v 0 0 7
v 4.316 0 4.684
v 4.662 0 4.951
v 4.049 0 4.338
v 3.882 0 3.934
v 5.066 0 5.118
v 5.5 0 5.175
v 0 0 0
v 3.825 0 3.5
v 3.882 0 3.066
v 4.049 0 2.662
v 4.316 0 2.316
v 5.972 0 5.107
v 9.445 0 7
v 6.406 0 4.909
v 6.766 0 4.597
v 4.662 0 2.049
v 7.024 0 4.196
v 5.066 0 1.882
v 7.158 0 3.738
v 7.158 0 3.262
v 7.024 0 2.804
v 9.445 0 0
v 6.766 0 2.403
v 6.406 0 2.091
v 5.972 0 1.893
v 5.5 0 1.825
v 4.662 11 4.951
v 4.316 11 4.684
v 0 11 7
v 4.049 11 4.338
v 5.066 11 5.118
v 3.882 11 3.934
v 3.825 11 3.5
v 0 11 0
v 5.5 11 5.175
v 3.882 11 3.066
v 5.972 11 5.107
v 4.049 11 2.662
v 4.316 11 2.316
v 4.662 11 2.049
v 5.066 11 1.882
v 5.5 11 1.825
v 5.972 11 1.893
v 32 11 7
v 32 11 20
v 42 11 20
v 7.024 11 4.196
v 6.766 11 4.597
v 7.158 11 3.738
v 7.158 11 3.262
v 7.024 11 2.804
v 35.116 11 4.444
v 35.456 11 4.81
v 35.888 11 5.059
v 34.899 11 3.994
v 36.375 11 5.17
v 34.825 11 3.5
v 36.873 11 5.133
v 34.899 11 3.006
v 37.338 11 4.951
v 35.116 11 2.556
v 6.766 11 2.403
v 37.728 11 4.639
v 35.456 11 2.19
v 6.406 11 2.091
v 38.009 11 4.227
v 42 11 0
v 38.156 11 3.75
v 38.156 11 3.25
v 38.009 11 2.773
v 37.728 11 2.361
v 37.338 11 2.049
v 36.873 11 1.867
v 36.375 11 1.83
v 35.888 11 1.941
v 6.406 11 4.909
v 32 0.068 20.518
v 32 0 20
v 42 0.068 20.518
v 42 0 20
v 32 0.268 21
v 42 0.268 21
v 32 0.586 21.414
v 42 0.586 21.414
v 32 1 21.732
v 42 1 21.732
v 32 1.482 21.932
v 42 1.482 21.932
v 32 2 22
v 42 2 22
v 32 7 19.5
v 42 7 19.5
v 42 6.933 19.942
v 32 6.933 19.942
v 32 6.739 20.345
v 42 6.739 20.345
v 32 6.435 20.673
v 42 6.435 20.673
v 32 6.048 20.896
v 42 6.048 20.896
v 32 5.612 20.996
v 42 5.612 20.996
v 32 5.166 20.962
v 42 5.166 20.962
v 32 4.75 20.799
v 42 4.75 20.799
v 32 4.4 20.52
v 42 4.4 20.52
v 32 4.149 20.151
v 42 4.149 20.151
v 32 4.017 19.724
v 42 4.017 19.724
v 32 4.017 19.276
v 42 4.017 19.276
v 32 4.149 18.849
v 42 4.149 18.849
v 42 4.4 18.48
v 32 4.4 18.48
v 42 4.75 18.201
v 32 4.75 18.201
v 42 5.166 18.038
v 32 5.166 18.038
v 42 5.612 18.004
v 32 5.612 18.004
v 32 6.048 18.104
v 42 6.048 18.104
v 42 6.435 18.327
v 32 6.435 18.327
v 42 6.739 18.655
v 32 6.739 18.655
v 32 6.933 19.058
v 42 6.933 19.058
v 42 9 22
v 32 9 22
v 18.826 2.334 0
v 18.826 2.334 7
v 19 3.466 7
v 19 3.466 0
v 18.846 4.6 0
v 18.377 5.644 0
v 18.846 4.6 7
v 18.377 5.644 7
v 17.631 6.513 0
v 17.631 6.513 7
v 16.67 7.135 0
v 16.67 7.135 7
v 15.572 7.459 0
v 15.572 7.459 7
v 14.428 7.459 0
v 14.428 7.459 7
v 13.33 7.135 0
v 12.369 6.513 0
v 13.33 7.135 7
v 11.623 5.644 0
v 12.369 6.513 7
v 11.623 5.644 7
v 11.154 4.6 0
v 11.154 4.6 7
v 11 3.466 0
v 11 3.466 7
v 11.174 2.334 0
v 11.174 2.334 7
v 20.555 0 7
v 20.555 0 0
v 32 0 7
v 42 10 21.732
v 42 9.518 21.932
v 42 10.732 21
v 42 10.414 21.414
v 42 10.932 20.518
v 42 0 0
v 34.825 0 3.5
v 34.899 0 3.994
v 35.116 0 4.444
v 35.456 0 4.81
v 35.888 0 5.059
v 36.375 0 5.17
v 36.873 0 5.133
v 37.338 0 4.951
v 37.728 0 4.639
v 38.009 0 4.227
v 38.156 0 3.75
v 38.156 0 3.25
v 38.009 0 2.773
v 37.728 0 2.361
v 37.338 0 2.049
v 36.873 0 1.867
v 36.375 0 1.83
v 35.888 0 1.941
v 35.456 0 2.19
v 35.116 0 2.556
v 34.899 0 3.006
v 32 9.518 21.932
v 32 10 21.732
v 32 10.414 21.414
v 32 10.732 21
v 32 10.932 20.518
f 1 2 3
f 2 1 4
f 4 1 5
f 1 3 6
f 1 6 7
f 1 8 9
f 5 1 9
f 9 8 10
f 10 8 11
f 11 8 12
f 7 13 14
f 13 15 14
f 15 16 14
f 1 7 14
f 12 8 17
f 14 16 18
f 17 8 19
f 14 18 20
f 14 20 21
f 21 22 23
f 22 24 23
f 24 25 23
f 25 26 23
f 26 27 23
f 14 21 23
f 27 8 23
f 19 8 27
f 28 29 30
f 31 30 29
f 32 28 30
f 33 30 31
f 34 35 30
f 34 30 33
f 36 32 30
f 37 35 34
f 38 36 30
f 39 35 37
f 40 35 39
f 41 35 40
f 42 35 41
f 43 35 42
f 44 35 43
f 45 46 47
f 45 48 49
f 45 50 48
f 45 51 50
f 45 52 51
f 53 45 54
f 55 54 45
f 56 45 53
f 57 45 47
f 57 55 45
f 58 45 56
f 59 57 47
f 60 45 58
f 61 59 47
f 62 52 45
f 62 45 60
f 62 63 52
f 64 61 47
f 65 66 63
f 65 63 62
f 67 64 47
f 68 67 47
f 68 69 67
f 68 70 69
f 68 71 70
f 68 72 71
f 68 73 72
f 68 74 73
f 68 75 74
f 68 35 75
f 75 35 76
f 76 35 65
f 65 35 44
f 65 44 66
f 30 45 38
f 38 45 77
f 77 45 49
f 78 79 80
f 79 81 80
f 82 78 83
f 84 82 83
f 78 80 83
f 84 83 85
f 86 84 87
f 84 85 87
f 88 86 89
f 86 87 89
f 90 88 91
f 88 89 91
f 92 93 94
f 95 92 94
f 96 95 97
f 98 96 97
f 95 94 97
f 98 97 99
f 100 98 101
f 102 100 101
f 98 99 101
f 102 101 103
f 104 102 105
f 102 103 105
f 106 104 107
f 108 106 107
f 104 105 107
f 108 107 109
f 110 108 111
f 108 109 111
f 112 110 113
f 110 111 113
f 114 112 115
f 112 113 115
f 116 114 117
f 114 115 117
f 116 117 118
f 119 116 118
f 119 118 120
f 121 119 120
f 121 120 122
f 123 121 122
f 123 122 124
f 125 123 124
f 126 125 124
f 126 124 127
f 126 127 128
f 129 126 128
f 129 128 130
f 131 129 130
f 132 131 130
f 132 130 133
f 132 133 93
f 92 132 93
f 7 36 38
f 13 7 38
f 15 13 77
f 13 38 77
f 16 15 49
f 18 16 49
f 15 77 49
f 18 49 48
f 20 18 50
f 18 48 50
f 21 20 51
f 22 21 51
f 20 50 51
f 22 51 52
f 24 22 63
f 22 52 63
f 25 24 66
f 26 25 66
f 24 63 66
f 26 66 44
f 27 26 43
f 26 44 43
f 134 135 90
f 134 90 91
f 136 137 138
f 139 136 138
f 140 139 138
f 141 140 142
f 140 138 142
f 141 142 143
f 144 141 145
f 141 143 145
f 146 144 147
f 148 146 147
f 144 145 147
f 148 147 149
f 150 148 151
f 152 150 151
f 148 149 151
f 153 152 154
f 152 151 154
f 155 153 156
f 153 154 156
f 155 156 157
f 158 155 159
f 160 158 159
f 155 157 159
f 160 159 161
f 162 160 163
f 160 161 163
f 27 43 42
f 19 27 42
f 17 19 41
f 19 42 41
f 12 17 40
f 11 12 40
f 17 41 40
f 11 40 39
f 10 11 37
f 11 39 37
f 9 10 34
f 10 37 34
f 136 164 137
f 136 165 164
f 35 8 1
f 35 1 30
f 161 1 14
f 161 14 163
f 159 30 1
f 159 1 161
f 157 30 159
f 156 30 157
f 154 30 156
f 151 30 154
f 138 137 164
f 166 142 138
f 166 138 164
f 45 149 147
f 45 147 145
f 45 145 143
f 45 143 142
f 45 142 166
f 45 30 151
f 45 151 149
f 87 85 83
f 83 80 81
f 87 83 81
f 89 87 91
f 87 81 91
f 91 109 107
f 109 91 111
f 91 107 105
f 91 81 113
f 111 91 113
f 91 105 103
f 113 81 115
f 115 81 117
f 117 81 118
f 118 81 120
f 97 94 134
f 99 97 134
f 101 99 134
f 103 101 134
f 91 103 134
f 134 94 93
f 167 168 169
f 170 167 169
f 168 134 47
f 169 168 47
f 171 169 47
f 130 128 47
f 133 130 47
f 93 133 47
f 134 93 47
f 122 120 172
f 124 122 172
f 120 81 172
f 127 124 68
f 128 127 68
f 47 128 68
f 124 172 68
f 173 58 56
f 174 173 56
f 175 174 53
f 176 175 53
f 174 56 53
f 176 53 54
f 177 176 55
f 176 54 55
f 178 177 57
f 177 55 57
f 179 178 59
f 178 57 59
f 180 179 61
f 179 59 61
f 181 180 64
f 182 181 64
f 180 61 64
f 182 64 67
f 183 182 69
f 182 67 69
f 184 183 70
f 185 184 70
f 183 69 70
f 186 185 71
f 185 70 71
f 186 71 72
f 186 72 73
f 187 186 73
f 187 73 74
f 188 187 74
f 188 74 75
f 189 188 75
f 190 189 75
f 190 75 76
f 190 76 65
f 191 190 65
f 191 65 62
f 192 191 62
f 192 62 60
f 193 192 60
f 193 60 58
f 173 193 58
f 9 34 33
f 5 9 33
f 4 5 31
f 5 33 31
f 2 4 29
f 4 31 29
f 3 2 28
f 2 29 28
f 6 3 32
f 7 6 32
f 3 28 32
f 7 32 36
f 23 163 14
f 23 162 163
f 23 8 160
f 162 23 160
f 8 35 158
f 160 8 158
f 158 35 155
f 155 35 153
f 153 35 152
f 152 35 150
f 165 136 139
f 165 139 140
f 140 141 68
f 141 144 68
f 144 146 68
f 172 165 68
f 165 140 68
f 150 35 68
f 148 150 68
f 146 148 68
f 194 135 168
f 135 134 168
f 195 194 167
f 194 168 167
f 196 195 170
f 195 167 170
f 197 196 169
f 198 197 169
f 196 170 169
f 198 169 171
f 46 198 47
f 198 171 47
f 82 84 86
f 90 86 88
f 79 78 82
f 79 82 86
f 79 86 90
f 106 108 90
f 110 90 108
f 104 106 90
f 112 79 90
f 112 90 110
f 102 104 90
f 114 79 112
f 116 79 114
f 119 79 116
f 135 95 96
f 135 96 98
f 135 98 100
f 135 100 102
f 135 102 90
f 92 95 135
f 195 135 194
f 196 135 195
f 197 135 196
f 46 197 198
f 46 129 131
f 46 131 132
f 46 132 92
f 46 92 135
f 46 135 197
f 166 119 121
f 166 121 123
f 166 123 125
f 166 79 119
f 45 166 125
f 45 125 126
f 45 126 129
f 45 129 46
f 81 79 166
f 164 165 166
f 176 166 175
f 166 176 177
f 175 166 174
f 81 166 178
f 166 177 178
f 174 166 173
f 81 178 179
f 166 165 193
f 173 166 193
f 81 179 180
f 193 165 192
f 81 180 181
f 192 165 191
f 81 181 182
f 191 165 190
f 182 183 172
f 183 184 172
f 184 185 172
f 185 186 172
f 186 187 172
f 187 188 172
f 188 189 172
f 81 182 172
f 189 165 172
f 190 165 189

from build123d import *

# Parameters (mm, degrees)
F1_W        = 42
F1_H        = 11
F2_DEPTH    = 7
F3_R        = 4
F4_DEPTH    = 25
F5_T1_DEPTH = 25.9605224852
F7_DEPTH    = 25
F8_W        = 10
F8_H        = 11
F9_DEPTH    = 15
F10_R       = 1.5
F11_DEPTH   = 25
F12_R       = 2


# Not quite as in the source:
# - a fillet or chamfer that OpenCascade refuses, or shapes differently, is made with other operations: its cross-section is extruded or revolved along the edge and cut away or added


with BuildPart() as f2:
    # F1 (on Top) → F2 (new body)
    with BuildSketch(Plane.XY):
        with Locations((21, 5.5)):
            Rectangle(F1_W, F1_H)
    extrude(amount=F2_DEPTH)

    # F3 (on face) → F4 (cut)
    with BuildSketch(Plane.XY.offset(7)):
        with Locations((15, 3.5)):
            Circle(F3_R)
    extrude(amount=-F4_DEPTH, mode=Mode.SUBTRACT)

    # F5: chamfer of 7 on 2 edges, made by hand

    # F5_s2 → F5_t1 (cut)
    with BuildSketch(Plane.XY.offset(-9.4802612426)):
        with BuildLine():
            Line((20.721915214, -0.225000294), (18.6596772309, 2.5591704653))
            Line((18.6596772309, 2.5591704653), (18.5257555, 2.5999745093))
            ThreePointArc((18.5257555, 2.5999745093), (18.0236462707, 1.1005910665), (16.8687144645, 0.1225))
            Line((16.8687144645, 0.1225), (16.9364916731, -0.14))
            ThreePointArc((16.9364916731, -0.14), (18.8292034436, -0.14), (20.721915214, -0.365000294))
            Line((20.721915214, -0.365000294), (20.721915214, -0.225000294))
        make_face()
        with BuildLine():
            Line((11.3403227691, 2.5591704653), (9.278084786, -0.225000294))
            Line((9.278084786, -0.225000294), (9.278084786, -0.365000294))
            ThreePointArc((9.278084786, -0.365000294), (11.1707965564, -0.14), (13.0635083269, -0.14))
            Line((13.0635083269, -0.14), (13.1312855355, 0.1225))
            ThreePointArc((13.1312855355, 0.1225), (11.9763537293, 1.1005910665), (11.4742445, 2.5999745093))
            Line((11.4742445, 2.5999745093), (11.3403227691, 2.5591704653))
        make_face()
    extrude(amount=F5_T1_DEPTH, mode=Mode.SUBTRACT)

    # F6 (on face) → F7 (cut)
    with BuildSketch(Plane(origin=(0, 11, 0), x_dir=(-1, 0, 0), z_dir=(0, 1, 0))):
        with BuildLine():
            Line((-5.5, 3.5), (-3.825, 3.5))
            ThreePointArc((-3.825, 3.5), (-4.3155961415, 4.6844038585), (-5.5, 5.175))
            Line((-5.5, 5.175), (-5.5, 3.5))
        make_face()
        with BuildLine():
            ThreePointArc((-5.5, 1.825), (-4.3155961415, 2.3155961415), (-3.825, 3.5))
            Line((-3.825, 3.5), (-5.5, 3.5))
            Line((-5.5, 3.5), (-5.5, 1.825))
        make_face()
        with BuildLine():
            Line((-5.5, 3.5), (-5.5, 5.175))
            ThreePointArc((-5.5, 5.175), (-7.175, 3.5), (-5.5, 1.825))
            Line((-5.5, 1.825), (-5.5, 3.5))
        make_face()
        with BuildLine():
            ThreePointArc((-38.175, 3.5), (-36.5, 1.825), (-34.825, 3.5))
            ThreePointArc((-34.825, 3.5), (-36.5, 5.175), (-38.175, 3.5))
        make_face()
    extrude(amount=-F7_DEPTH, mode=Mode.SUBTRACT)

    # F8 (on face) → F9 (join)
    with BuildSketch(Plane.XY.offset(7)):
        with Locations((37, 5.5)):
            Rectangle(F8_W, F8_H)
    extrude(amount=F9_DEPTH)

    # F10 (on face) → F11 (cut)
    with BuildSketch(Plane.YZ.offset(42)):
        with Locations((5.5, 19.5)):
            Circle(F10_R)
    extrude(amount=-F11_DEPTH, mode=Mode.SUBTRACT)

    # F12
    f12_edges = [f2.edges().sort_by_distance(p)[0] for p in [
        (37, 0, 22),
        (37, 11, 22),
    ]]
    fillet(f12_edges, radius=F12_R)


solid = f2.part
